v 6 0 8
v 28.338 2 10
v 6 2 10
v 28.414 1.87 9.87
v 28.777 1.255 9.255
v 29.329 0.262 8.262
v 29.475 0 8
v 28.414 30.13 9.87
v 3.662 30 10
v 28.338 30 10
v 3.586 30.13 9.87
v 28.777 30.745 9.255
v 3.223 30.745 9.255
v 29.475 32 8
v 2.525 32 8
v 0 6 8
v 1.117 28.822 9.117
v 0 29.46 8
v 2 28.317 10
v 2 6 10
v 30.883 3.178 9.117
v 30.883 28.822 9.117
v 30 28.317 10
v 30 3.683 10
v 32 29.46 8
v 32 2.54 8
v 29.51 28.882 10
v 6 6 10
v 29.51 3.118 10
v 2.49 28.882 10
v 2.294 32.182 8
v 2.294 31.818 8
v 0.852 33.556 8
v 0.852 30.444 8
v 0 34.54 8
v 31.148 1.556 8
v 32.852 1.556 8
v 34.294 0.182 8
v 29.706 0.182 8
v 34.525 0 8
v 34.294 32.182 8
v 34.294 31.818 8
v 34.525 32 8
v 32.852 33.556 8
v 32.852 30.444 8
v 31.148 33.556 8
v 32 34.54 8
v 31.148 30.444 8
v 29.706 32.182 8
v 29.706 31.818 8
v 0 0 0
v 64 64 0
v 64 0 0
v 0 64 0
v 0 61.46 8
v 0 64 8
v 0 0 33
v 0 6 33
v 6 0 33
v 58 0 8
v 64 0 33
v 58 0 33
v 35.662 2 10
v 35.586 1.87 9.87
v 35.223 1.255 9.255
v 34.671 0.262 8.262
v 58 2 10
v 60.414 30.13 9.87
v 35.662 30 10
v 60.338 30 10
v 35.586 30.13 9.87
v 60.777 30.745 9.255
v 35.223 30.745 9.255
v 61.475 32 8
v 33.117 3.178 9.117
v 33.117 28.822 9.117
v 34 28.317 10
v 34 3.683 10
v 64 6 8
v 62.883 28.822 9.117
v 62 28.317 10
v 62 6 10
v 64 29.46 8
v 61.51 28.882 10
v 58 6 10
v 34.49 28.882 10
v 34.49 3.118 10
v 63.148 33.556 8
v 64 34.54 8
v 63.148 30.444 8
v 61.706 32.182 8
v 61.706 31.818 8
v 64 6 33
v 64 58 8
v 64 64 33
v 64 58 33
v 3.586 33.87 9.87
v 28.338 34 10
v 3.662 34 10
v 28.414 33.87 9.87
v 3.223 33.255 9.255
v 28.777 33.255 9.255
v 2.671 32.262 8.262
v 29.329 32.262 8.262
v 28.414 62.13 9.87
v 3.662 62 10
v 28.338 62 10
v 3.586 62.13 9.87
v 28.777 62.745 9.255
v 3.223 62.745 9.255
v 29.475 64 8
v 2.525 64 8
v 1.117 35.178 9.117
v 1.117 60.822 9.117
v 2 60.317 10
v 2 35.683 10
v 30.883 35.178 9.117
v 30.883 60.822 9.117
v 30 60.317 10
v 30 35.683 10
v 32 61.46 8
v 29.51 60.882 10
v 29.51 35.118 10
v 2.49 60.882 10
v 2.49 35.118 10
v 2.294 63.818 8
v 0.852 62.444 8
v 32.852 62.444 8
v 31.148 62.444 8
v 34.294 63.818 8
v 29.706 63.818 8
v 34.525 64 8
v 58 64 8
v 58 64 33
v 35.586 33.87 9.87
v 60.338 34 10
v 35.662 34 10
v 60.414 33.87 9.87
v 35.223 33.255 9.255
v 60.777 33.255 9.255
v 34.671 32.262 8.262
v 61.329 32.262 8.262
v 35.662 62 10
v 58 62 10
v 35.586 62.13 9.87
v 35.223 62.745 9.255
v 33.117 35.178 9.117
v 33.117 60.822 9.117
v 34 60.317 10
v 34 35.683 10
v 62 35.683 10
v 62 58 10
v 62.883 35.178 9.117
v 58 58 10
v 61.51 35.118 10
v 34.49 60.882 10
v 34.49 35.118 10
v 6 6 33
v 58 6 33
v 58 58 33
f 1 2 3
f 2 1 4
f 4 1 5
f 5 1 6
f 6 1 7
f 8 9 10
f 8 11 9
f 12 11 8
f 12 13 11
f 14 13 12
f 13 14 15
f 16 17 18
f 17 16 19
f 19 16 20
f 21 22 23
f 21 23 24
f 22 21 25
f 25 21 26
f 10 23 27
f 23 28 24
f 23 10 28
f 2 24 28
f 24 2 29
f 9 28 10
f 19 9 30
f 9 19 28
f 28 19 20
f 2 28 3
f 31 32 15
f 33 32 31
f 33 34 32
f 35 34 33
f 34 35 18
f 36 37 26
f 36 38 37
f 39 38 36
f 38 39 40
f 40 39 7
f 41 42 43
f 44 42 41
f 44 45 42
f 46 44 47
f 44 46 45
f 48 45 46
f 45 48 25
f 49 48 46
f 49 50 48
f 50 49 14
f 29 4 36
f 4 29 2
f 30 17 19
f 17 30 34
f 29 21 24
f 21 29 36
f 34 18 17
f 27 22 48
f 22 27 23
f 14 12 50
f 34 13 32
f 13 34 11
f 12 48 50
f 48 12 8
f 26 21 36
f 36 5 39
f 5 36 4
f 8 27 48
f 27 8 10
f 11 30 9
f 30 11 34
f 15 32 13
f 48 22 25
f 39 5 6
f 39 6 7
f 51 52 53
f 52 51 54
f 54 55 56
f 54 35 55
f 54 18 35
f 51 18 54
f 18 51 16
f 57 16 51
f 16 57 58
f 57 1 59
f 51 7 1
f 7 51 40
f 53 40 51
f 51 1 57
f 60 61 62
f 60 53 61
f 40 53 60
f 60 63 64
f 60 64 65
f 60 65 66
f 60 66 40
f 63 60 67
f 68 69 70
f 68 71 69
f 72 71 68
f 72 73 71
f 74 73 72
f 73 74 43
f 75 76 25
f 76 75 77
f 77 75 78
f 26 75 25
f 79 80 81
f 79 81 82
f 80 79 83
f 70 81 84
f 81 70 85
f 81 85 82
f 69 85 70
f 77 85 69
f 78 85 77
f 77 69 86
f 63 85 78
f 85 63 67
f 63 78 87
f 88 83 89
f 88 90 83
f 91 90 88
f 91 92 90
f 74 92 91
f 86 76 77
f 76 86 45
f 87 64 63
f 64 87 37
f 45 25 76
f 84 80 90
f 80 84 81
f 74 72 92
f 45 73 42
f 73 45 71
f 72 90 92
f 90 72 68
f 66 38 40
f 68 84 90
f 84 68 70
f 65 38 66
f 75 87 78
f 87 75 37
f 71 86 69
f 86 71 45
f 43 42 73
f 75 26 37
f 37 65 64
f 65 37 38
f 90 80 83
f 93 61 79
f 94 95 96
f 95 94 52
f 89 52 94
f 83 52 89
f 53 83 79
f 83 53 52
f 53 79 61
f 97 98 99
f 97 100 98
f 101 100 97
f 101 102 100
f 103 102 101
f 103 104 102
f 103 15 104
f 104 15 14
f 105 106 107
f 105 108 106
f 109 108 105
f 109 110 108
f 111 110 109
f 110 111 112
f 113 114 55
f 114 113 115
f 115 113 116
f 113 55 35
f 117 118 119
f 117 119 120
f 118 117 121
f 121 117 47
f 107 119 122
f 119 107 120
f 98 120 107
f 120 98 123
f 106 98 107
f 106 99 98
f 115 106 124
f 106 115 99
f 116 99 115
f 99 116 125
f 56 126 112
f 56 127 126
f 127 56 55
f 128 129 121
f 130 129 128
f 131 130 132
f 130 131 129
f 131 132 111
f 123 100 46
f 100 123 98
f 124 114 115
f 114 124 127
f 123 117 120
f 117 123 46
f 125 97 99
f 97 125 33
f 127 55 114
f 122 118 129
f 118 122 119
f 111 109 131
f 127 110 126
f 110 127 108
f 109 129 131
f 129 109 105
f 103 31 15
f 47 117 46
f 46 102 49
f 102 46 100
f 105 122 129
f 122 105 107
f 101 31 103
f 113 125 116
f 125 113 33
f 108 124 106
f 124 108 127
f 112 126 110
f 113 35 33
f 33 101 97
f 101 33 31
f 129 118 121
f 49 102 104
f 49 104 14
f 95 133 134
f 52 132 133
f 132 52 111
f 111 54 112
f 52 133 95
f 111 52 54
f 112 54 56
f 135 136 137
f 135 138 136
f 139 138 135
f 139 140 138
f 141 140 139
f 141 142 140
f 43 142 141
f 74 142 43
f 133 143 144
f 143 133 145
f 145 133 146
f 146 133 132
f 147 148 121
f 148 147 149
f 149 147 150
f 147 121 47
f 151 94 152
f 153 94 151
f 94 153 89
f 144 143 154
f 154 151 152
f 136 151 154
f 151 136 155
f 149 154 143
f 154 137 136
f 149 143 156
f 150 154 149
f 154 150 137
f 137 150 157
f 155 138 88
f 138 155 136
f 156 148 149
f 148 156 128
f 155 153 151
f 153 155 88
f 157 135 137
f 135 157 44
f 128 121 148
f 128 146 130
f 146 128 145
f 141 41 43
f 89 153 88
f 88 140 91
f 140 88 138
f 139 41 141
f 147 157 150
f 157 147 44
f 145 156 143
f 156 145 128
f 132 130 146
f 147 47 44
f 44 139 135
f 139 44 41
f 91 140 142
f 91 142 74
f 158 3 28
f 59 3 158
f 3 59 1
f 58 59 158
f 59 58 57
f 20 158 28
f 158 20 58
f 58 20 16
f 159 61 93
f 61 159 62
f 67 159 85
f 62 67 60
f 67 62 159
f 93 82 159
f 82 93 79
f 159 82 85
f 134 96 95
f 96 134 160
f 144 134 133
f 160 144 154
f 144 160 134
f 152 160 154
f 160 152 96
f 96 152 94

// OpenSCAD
// file: ModularDungeonTileLibrary.scad
//Constants
wallleft = 0;
wallbottom = 1;
wallright = 2;
walltop = 3;
wallcenter = 4;
walldoubleright = 5;


//Variables
size = 32;
connectorlength = size-10;
connectorwidth = 6;
connectorheight = 4;
baseheight = 8;
topperheight = 2;
topperrounded = true;
walllength = size;
wallheight = 25;
wallwidth = 6;
wallwidththin = 4;


//Functions
function hypotenuse_ra(side_a, side_b) =
    sqrt(pow(side_a, 2) + pow(side_b, 2));
    
    
//Modules    
module mtdl_Base_Connector(cw,cl,ch) {
    translate([-connectorwidth/2,-connectorlength/2,-connectorheight/2]) {
        cube([cw,cl,ch/2]);
        translate([cw/3,0,ch/2])
            cube([cw/3,cl,ch/2]);
        translate([-(cw-2)/2,cl/2-2,0])
            cube([cw+4,4,ch]);
    }
}

module mdtl_Base(s,bh)
{
    cube([s,s,bh]);
}

module mdtl_Topper(s,bh,th,tr)
{
    if (tr) {
        translate([0,0,bh])
            intersection() {
                difference () {
                        cube([s,s,th]);
                        union () {
                        rotate(a=45, v=[1,0,0])
                            cube([s,th*2,th*2]);
                        translate([0,s,0])
                            rotate(a=45, v=[1,0,0])
                                cube([s,th*2,th*2]);
                        rotate(a=-45, v=[0,1,0])
                            cube([th*2,s,th*2]);
                        translate([s,0,0])
                            rotate(a=-45, v=[0,1,0])
                                cube([th*2,s,th*2]);
                        }
                }
                translate([s/2,s/2,0])
                    cylinder(
                        h=th, 
                        r1=hypotenuse_ra(s/2-1.2, s/2-1.2), 
                        r2=hypotenuse_ra(s/2-th-.8, s/2-th-.8), 
                        center=false, 
                        $fa=.1);
            }    
    }
    else {
        translate([0,0,bh])
            difference() {
                cube([s,s,th]);
                union () {
                rotate(a=45, v=[1,0,0])
                    cube([s,th*2,th*2]);
                translate([0,s,0])
                    rotate(a=45, v=[1,0,0])
                        cube([s,th*2,th*2]);
                rotate(a=-45, v=[0,1,0])
                    cube([th*2,s,th*2]);
                translate([s,0,0])
                    rotate(a=-45, v=[0,1,0])
                        cube([th*2,s,th*2]);
                }
            }    
    }
}

module mdtl_Base_1x1(s,bh,th,tr) 
{
    difference () {
        union () {
            mdtl_Base(s,bh);
            mdtl_Topper(s,bh,th,tr);
        }
//        union () {
//            translate([size/2,size,baseheight/2])
//                rotate([0,180,0])
//                    mtdl_Base_Connector(connectorwidth,connectorlength,connectorheight);
//            translate([size/2,0,baseheight/2])
//                rotate([0,180,0])
//                    mtdl_Base_Connector(connectorwidth,connectorlength,connectorheight);
//            translate([size,size/2,baseheight/2])
//                rotate([0,180,90])
//                    mtdl_Base_Connector(connectorwidth,connectorlength,connectorheight);
//            translate([0,size/2,baseheight/2])
//                rotate([0,180,90])
//                    mtdl_Base_Connector(connectorwidth,connectorlength,connectorheight);
//        }
    }
}

module mdtl_Base_1x2(s,bh,th,tr)
{
    union () {
        mdtl_Base_1x1(s,bh,th,tr);
        translate([s,0,0])
            mdtl_Base_1x1(s,bh,th,tr);
    }
}
 
module mdtl_Base_2x2(s,bh,th,tr)
{
    union () {
        mdtl_Base_1x2(s,bh,th,tr);
        translate([0,s,0])
            mdtl_Base_1x2(s,bh,th,tr);
    }
}
 
module mdtl_Base_2x4(s,bh,th,tr)
{
    union () {
        mdtl_Base_2x2(s,bh,th,tr);
        translate([s*2,0,0])
            mdtl_Base_2x2(s,bh,th,tr);
    }
}
 
module mdtl_Base_4x4(s,bh,th,tr)
{
    union () {
        mdtl_Base_2x4(s,bh,th,tr);
        translate([0,s*2,0])
            mdtl_Base_2x4(s,bh,th,tr);
    }
}
 
module mdtl_Wall_1(w,l,h)
{
    translate([0,0,baseheight])
        cube([w,l,h]);   
}

module mdtl_Wall_1_Position(w,l,h,p)
{
    if (p==0) {
        mdtl_Wall_1(w,l,h);
    }
    
    else if (p==1) {
        rotate(a=-90)
           translate([-w,0,0])
               mdtl_Wall_1(w,l,h);       
    }
    
    else if (p==2) {
        translate([(size)-w,0,0])
            mdtl_Wall_1(w,l,h);
    }
    
    else if (p==3) {
        rotate(a=-90)
            translate([-l,0,0])
                mdtl_Wall_1(w,l,h);
    }
    
    else if (p==4) {
        translate([(size)-w/2,0,0])
            mdtl_Wall_1(w,l,h);
    }
    
    else if (p==5) {
        translate([(size*2)-w,0,0])
           mdtl_Wall_1(w,l,h);       
    }
}

module mdtl_Wall_2(w,l,h)
{
    union() {
        mdtl_Wall_1(w,l,h);
        translate([0,l,0])
            mdtl_Wall_1(w,l,h);
    }
}

module mdtl_Wall_2_Position(w,l,h,p)
{
    if (p==0) {
        mdtl_Wall_2(w,l,h);
    }
    
    else if (p==1) {
        rotate(a=-90)
            translate([-w,0,0])
                mdtl_Wall_2(w,l,h);
    }
    
    else if (p==2) {
    translate([(size*2)-w,0,0])
        mdtl_Wall_2(w,l,h);
    }
    
    else if (p==3) {
        rotate(a=-90)
            translate([-l*2,0,0])
                mdtl_Wall_2(w,l,h);
    }
    
    else if (p==4) {
        translate([(size)-w/2,0,0])
            mdtl_Wall_2(w,l,h);
    }
}
// main file
include <ModularDungeonTileLibrary.scad>; 

mdtl_Base_2x2(size,baseheight,topperheight,topperrounded);
//Create Pillar with modified wall
mdtl_Wall_2_Position(wallwidth,wallwidth/2,wallheight,wallleft);
mdtl_Wall_2_Position(wallwidth,wallwidth/2,wallheight,wallright);
translate([0,walllength*2-wallwidth,0])
    mdtl_Wall_2_Position(wallwidth,wallwidth/2,wallheight,wallright);
